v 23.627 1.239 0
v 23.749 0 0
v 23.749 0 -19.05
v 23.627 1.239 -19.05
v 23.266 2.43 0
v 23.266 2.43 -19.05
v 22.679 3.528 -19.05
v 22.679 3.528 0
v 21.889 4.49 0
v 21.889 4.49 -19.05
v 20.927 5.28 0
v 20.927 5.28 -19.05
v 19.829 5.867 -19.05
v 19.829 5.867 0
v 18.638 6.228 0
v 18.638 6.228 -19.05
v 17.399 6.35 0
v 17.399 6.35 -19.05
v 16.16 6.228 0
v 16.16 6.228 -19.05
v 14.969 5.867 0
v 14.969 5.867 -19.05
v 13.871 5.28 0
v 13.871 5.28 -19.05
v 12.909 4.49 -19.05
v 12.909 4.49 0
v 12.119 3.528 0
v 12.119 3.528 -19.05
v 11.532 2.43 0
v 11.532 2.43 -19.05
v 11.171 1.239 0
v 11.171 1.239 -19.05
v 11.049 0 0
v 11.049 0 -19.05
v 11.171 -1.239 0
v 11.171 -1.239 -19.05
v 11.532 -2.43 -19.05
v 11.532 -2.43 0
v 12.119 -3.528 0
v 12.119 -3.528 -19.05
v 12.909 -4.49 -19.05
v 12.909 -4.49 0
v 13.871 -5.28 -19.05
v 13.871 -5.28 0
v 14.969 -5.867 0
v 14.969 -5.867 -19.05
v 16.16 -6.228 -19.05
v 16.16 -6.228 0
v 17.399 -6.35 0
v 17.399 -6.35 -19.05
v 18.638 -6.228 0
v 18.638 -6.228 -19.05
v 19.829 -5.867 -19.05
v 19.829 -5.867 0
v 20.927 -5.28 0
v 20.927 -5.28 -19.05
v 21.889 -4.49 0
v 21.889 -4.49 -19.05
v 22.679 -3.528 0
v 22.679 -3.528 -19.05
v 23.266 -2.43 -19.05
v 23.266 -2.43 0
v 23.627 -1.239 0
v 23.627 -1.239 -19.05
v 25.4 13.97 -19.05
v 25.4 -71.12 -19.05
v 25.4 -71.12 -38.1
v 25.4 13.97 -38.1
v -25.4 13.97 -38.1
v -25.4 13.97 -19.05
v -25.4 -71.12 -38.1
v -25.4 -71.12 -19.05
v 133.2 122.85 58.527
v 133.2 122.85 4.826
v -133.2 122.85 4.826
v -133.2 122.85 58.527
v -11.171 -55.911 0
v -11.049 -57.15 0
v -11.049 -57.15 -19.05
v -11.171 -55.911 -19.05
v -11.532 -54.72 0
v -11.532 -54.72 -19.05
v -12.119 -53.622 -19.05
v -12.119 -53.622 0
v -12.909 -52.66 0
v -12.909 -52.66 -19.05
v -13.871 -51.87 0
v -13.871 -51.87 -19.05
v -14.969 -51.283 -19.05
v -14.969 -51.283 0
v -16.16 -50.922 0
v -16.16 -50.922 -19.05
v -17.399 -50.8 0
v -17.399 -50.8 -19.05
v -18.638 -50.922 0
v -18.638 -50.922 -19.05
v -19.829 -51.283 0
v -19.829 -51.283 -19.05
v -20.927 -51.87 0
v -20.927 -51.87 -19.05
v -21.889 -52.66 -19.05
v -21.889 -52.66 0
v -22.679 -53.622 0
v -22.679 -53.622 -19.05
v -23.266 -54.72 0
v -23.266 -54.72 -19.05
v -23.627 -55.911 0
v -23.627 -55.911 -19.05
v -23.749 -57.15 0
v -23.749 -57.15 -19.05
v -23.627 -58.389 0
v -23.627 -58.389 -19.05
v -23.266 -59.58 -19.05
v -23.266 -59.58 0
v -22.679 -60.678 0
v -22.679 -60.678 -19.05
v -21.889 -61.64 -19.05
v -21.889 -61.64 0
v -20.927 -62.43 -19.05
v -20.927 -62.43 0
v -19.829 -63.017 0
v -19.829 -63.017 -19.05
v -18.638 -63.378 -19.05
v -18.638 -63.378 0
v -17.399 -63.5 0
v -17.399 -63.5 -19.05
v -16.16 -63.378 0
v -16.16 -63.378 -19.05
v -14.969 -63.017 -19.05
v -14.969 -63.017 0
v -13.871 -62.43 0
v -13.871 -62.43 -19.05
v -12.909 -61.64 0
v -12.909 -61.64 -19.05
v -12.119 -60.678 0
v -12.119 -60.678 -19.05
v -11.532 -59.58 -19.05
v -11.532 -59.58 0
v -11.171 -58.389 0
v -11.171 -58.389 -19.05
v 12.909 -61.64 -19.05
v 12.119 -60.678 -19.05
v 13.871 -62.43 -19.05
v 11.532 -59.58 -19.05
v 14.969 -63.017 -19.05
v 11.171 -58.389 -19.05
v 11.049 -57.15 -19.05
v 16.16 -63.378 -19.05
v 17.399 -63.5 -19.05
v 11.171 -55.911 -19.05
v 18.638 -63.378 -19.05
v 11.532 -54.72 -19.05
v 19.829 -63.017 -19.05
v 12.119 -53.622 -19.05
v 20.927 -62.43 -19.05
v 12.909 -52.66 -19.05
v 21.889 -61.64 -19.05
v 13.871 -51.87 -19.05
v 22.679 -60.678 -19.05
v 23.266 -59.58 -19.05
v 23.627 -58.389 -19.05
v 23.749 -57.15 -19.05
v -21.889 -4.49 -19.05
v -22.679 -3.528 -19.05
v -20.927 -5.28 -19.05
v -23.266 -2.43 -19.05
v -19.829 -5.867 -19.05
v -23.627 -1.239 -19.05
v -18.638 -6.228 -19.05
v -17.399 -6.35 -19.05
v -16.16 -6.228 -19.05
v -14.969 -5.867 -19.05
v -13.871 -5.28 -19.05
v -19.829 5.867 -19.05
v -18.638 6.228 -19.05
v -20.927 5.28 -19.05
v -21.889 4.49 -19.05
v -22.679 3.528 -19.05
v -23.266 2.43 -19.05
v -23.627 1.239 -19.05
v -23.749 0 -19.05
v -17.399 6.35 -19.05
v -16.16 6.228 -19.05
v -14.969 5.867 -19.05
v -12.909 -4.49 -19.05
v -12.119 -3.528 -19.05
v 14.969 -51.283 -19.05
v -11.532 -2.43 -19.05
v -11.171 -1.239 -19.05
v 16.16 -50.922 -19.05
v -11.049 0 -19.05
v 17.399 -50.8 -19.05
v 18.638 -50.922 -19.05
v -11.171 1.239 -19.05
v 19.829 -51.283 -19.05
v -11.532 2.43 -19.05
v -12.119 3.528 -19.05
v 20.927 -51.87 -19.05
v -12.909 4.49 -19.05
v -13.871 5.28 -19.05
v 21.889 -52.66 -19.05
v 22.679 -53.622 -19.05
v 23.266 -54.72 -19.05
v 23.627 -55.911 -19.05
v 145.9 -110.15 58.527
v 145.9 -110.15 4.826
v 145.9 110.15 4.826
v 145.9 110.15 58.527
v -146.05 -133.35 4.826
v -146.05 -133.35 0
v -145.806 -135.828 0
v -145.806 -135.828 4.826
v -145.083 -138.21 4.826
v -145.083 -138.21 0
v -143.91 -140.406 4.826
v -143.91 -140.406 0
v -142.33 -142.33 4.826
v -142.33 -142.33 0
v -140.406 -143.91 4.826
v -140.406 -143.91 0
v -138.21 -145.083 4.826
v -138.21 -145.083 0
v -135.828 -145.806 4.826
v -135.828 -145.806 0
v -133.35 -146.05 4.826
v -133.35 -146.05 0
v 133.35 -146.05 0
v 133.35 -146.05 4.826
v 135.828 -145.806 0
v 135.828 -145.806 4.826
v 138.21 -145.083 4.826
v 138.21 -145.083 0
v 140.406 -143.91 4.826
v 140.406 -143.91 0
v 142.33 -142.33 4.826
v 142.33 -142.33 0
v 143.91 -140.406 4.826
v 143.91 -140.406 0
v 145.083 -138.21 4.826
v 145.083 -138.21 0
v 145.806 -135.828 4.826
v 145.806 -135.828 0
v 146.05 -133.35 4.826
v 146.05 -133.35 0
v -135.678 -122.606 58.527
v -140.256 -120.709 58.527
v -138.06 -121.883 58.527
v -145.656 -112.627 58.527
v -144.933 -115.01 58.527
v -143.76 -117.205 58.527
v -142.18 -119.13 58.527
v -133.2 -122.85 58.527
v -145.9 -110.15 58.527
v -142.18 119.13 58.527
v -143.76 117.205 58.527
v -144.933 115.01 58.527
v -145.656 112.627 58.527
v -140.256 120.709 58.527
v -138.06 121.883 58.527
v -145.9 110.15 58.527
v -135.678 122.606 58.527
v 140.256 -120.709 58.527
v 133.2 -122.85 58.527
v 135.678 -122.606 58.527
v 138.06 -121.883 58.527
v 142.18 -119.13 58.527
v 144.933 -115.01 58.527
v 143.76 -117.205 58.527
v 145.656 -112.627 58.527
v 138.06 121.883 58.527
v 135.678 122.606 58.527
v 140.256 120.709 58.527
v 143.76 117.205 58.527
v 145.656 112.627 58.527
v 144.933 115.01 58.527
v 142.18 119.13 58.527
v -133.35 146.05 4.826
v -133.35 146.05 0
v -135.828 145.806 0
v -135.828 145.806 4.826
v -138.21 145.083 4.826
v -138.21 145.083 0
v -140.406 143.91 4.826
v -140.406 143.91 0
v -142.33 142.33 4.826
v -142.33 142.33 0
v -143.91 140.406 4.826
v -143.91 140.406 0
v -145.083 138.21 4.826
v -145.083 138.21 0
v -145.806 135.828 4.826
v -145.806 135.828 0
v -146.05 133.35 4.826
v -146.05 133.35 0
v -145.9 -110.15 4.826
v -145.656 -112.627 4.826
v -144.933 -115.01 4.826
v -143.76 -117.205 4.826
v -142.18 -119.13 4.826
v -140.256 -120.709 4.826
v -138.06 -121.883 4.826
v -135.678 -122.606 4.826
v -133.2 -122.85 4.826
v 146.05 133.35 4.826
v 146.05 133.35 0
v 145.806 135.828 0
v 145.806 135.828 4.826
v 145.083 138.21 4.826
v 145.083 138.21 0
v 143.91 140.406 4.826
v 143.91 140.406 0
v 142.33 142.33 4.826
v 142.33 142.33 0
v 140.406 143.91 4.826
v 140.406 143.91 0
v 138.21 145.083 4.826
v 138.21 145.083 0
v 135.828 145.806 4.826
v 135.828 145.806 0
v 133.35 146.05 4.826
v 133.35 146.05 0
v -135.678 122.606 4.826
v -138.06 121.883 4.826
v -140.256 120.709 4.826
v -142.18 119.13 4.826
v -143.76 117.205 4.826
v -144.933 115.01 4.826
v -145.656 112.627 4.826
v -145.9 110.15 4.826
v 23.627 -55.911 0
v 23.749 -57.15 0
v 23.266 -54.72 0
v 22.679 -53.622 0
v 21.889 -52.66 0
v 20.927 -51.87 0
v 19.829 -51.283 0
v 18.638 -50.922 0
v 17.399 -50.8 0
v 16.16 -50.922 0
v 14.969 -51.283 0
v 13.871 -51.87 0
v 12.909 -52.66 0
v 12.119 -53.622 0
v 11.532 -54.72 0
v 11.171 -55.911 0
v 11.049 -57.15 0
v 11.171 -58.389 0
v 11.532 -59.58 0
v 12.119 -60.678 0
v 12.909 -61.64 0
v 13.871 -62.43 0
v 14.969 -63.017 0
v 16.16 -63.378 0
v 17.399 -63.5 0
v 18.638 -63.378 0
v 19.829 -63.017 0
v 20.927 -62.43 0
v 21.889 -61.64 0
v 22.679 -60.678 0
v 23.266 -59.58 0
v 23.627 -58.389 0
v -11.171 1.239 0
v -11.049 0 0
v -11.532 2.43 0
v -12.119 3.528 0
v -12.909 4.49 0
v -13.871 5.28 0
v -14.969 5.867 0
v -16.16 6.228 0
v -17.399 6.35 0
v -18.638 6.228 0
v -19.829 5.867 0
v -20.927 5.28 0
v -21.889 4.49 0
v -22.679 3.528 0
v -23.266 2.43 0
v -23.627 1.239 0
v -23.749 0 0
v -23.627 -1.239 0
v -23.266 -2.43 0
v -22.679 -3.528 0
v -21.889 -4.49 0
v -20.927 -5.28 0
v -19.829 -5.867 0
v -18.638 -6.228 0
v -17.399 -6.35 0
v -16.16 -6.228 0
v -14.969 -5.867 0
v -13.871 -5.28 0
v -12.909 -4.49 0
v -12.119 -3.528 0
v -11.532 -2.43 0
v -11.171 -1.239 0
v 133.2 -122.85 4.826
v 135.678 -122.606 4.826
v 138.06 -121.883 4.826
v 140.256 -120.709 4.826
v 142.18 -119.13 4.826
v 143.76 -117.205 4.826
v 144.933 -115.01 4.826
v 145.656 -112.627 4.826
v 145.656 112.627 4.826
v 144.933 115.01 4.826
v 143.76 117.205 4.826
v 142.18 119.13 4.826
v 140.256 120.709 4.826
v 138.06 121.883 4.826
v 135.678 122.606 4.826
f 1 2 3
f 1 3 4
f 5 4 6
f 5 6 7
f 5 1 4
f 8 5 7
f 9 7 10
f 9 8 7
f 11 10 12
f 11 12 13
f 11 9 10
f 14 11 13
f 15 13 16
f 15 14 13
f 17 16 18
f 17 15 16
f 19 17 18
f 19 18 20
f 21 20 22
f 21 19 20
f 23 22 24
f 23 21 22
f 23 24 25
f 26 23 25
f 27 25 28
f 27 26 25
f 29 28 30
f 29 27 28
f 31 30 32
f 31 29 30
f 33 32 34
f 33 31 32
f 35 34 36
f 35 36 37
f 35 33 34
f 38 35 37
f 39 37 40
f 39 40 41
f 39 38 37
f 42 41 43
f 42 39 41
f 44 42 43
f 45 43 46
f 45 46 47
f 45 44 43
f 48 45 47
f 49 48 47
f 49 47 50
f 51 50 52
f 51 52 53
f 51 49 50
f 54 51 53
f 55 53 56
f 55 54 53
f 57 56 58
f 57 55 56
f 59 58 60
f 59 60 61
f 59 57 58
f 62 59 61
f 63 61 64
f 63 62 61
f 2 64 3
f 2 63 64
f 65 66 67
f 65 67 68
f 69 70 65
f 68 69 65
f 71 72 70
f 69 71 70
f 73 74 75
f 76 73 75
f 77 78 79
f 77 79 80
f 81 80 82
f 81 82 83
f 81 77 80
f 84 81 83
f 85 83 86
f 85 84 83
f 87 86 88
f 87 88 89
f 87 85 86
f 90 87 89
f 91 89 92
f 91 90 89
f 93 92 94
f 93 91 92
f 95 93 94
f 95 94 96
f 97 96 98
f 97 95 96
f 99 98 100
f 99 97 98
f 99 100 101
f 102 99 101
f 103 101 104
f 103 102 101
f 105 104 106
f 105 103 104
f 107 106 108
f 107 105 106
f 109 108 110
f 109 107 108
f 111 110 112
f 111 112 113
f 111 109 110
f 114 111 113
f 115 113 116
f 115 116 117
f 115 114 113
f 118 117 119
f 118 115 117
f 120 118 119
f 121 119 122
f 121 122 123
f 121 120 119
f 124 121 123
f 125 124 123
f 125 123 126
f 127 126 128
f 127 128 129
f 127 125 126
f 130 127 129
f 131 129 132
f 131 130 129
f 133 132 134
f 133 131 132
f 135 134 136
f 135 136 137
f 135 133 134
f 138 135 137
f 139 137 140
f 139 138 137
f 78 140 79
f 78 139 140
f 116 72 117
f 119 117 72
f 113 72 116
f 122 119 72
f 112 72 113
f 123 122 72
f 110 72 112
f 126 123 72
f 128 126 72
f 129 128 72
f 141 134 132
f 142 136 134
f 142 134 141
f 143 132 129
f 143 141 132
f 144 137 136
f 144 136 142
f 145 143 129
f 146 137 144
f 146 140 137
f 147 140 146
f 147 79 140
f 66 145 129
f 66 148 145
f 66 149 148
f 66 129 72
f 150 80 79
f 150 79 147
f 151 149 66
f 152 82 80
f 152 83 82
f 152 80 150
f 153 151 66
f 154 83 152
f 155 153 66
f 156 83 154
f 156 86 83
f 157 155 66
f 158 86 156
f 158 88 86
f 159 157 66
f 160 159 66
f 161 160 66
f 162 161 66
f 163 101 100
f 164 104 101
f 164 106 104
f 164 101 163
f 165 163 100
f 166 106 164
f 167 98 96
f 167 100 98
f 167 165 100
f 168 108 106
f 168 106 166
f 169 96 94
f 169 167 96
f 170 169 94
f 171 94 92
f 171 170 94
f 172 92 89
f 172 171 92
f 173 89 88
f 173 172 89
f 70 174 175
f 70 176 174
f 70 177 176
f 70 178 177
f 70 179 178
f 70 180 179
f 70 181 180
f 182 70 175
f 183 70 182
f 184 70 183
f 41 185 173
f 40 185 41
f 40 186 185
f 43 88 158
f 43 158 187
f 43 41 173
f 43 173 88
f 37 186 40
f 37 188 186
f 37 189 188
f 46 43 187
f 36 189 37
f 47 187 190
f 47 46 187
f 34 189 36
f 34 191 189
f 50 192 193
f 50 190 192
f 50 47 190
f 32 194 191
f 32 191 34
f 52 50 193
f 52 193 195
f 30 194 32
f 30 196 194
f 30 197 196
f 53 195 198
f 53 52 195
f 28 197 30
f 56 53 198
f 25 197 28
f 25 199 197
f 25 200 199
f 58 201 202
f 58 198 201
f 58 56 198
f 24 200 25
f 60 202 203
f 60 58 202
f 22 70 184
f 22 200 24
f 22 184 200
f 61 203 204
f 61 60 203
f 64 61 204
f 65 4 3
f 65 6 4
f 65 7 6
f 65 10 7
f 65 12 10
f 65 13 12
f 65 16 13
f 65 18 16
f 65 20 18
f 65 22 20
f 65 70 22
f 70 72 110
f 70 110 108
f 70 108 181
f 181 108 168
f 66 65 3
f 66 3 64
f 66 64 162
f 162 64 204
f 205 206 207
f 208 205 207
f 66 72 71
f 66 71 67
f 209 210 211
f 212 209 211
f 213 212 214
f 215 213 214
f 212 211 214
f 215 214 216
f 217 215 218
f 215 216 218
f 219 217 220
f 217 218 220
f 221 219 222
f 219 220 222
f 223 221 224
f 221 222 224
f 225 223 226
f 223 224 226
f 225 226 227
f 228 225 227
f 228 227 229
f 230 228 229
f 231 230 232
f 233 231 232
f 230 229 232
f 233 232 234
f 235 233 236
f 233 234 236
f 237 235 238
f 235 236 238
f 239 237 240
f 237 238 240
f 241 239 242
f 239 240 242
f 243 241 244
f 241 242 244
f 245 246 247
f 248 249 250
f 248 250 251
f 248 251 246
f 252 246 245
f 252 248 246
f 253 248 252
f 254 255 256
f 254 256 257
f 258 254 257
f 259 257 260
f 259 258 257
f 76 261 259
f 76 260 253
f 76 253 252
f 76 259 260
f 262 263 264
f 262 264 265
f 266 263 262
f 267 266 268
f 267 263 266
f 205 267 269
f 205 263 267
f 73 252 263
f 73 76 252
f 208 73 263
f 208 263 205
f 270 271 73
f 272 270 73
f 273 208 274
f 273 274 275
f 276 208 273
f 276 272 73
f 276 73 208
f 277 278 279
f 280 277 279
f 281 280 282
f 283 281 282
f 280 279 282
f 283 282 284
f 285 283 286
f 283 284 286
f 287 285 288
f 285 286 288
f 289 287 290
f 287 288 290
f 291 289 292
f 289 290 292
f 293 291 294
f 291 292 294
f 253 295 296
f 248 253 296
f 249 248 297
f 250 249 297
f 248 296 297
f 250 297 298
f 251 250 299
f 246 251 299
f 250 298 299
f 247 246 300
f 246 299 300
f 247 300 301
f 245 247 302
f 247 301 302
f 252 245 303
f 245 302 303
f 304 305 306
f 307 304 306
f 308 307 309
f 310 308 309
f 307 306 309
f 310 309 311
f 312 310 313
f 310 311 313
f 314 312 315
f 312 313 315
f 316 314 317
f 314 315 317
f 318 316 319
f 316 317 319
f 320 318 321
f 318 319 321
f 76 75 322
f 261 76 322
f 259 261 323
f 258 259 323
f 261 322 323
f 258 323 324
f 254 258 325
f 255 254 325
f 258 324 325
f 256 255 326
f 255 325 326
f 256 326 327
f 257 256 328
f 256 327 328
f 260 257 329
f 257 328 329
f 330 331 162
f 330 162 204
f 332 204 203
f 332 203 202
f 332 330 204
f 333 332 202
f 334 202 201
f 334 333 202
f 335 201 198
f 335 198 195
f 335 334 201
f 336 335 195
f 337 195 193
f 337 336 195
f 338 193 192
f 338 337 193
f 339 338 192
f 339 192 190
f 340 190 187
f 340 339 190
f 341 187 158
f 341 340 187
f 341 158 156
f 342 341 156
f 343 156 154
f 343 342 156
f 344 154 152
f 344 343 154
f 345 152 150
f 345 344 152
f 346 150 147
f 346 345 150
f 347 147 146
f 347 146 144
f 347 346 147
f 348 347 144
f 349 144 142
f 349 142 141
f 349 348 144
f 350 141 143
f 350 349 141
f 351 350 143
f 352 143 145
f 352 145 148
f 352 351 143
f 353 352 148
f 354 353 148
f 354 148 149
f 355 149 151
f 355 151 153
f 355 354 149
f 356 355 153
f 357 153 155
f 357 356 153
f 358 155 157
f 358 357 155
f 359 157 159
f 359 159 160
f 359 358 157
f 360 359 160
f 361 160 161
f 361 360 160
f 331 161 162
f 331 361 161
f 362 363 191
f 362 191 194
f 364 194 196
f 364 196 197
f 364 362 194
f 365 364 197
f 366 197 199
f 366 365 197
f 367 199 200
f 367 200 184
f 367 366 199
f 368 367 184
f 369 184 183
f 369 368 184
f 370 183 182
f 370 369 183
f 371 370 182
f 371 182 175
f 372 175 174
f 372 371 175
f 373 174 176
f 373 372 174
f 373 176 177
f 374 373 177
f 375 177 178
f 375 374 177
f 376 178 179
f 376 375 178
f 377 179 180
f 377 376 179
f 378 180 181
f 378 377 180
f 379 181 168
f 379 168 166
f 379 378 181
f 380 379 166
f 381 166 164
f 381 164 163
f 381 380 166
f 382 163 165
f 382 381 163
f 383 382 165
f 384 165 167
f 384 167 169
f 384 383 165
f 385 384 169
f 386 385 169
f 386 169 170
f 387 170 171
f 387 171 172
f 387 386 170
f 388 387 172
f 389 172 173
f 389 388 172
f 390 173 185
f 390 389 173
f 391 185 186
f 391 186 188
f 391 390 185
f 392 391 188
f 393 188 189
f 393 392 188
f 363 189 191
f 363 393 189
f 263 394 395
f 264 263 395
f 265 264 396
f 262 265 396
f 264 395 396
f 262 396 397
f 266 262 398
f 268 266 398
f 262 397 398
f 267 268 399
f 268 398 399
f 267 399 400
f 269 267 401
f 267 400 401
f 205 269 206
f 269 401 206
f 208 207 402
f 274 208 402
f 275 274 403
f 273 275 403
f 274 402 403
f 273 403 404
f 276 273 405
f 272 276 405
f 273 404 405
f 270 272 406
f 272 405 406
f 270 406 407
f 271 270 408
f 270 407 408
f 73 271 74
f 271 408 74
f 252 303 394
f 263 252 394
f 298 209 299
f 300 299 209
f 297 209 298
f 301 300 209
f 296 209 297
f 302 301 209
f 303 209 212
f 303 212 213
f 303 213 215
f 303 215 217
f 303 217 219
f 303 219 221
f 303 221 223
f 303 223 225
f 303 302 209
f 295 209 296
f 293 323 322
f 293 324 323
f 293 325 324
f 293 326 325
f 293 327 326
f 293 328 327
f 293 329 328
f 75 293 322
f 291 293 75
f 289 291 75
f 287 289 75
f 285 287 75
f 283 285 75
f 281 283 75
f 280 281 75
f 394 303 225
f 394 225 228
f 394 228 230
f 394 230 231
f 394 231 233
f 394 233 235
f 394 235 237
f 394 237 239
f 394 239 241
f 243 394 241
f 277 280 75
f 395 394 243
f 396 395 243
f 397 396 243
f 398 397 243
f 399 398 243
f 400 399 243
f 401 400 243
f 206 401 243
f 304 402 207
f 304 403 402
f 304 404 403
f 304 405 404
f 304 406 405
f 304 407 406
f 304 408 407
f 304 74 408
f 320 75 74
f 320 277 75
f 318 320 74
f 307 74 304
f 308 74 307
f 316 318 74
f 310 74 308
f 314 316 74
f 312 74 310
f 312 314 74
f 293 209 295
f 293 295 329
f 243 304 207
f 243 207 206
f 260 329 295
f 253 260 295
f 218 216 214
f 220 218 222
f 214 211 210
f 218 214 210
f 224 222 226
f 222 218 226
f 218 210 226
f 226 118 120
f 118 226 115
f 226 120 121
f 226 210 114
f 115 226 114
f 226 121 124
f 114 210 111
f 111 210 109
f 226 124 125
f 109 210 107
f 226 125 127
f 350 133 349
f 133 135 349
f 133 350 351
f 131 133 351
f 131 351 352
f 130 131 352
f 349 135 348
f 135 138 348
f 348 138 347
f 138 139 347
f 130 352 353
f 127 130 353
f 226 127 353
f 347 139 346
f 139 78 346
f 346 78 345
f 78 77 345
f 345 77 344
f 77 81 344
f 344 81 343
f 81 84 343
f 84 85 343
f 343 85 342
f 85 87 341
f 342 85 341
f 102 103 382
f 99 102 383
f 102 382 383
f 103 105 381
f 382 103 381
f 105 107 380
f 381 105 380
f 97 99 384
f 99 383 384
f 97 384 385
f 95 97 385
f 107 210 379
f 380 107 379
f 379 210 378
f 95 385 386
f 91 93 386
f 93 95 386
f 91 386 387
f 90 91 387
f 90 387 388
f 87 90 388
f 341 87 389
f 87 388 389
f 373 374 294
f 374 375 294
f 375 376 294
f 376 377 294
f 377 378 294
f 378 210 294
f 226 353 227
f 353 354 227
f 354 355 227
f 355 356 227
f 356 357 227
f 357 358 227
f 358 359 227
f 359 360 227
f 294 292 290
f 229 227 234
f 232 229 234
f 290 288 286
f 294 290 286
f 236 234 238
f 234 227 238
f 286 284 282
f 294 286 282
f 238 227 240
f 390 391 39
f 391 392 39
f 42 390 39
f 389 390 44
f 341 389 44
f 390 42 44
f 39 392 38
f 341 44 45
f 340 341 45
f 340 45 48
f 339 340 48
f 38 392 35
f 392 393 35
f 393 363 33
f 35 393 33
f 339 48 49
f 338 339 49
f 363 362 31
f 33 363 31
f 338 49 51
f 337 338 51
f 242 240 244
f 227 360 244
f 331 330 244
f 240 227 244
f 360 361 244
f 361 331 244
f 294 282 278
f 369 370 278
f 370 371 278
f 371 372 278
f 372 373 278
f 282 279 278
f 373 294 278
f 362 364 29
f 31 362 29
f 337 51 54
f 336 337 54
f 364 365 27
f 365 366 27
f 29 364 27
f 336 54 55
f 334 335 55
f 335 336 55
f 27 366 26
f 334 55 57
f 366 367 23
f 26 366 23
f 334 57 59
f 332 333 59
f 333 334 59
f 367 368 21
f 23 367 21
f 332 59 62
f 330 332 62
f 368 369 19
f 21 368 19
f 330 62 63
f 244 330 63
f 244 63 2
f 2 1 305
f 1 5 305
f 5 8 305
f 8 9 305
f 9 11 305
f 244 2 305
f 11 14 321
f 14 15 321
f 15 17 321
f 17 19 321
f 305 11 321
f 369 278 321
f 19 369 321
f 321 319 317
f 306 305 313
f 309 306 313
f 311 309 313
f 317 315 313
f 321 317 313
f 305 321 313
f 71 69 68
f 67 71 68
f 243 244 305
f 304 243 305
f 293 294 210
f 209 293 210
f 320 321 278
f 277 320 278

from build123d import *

# Parameters (mm, degrees)
F1_DEPTH = 4.826
F2_R     = 6.35
F3_DEPTH = 19.05
F5_W     = 50.8
F5_H     = 85.09
F6_DEPTH = 19.05
F8_DEPTH = 53.70068


with BuildPart() as f1:
    # F0 (on Top) → F1 (new body)
    with BuildSketch(Plane.XY):
        with BuildLine():
            ThreePointArc((146.05, 133.35), (142.330256, 142.330256), (133.35, 146.05))
            Line((133.35, 146.05), (-133.35, 146.05))
            ThreePointArc((-133.35, 146.05), (-142.330256, 142.330256), (-146.05, 133.35))
            Line((-146.05, 133.35), (-146.05, -133.35))
            ThreePointArc((-146.05, -133.35), (-142.330256, -142.330256), (-133.35, -146.05))
            Line((-133.35, -146.05), (133.35, -146.05))
            ThreePointArc((133.35, -146.05), (142.330256, -142.330256), (146.05, -133.35))
            Line((146.05, -133.35), (146.05, 133.35))
        make_face()
    extrude(amount=F1_DEPTH)

    # F2 (on Top) → F3 (join)
    with BuildSketch(Plane.XY):
        with Locations((-17.399, -57.15)):
            Circle(F2_R)
        with Locations((17.399, -57.15)):
            Circle(F2_R)
        with Locations((17.399, 0)):
            Circle(F2_R)
        with Locations((-17.399, 0)):
            Circle(F2_R)
    extrude(amount=-F3_DEPTH)

    # F5 (on offset) → F6 (join)
    with BuildSketch(Plane.XY.offset(-19.05)):
        with Locations((0, -28.575)):
            Rectangle(F5_W, F5_H)
    extrude(amount=-F6_DEPTH)

    # F7 (on face) → F8 (join)
    with BuildSketch(Plane.XY.offset(4.826)):
        with BuildLine():
            Line((-133.20014, -122.84964), (133.20014, -122.84964))
            ThreePointArc((133.20014, -122.84964), (142.180396, -119.129896), (145.90014, -110.14964))
            Line((145.90014, -110.14964), (145.90014, 110.14964))
            ThreePointArc((145.90014, 110.14964), (142.180396, 119.129896), (133.20014, 122.84964))
            Line((133.20014, 122.84964), (-133.20014, 122.84964))
            ThreePointArc((-133.20014, 122.84964), (-142.180396, 119.129896), (-145.90014, 110.14964))
            Line((-145.90014, 110.14964), (-145.90014, -110.14964))
            ThreePointArc((-145.90014, -110.14964), (-142.180396, -119.129896), (-133.20014, -122.84964))
        make_face()
    extrude(amount=F8_DEPTH)


solid = f1.part
